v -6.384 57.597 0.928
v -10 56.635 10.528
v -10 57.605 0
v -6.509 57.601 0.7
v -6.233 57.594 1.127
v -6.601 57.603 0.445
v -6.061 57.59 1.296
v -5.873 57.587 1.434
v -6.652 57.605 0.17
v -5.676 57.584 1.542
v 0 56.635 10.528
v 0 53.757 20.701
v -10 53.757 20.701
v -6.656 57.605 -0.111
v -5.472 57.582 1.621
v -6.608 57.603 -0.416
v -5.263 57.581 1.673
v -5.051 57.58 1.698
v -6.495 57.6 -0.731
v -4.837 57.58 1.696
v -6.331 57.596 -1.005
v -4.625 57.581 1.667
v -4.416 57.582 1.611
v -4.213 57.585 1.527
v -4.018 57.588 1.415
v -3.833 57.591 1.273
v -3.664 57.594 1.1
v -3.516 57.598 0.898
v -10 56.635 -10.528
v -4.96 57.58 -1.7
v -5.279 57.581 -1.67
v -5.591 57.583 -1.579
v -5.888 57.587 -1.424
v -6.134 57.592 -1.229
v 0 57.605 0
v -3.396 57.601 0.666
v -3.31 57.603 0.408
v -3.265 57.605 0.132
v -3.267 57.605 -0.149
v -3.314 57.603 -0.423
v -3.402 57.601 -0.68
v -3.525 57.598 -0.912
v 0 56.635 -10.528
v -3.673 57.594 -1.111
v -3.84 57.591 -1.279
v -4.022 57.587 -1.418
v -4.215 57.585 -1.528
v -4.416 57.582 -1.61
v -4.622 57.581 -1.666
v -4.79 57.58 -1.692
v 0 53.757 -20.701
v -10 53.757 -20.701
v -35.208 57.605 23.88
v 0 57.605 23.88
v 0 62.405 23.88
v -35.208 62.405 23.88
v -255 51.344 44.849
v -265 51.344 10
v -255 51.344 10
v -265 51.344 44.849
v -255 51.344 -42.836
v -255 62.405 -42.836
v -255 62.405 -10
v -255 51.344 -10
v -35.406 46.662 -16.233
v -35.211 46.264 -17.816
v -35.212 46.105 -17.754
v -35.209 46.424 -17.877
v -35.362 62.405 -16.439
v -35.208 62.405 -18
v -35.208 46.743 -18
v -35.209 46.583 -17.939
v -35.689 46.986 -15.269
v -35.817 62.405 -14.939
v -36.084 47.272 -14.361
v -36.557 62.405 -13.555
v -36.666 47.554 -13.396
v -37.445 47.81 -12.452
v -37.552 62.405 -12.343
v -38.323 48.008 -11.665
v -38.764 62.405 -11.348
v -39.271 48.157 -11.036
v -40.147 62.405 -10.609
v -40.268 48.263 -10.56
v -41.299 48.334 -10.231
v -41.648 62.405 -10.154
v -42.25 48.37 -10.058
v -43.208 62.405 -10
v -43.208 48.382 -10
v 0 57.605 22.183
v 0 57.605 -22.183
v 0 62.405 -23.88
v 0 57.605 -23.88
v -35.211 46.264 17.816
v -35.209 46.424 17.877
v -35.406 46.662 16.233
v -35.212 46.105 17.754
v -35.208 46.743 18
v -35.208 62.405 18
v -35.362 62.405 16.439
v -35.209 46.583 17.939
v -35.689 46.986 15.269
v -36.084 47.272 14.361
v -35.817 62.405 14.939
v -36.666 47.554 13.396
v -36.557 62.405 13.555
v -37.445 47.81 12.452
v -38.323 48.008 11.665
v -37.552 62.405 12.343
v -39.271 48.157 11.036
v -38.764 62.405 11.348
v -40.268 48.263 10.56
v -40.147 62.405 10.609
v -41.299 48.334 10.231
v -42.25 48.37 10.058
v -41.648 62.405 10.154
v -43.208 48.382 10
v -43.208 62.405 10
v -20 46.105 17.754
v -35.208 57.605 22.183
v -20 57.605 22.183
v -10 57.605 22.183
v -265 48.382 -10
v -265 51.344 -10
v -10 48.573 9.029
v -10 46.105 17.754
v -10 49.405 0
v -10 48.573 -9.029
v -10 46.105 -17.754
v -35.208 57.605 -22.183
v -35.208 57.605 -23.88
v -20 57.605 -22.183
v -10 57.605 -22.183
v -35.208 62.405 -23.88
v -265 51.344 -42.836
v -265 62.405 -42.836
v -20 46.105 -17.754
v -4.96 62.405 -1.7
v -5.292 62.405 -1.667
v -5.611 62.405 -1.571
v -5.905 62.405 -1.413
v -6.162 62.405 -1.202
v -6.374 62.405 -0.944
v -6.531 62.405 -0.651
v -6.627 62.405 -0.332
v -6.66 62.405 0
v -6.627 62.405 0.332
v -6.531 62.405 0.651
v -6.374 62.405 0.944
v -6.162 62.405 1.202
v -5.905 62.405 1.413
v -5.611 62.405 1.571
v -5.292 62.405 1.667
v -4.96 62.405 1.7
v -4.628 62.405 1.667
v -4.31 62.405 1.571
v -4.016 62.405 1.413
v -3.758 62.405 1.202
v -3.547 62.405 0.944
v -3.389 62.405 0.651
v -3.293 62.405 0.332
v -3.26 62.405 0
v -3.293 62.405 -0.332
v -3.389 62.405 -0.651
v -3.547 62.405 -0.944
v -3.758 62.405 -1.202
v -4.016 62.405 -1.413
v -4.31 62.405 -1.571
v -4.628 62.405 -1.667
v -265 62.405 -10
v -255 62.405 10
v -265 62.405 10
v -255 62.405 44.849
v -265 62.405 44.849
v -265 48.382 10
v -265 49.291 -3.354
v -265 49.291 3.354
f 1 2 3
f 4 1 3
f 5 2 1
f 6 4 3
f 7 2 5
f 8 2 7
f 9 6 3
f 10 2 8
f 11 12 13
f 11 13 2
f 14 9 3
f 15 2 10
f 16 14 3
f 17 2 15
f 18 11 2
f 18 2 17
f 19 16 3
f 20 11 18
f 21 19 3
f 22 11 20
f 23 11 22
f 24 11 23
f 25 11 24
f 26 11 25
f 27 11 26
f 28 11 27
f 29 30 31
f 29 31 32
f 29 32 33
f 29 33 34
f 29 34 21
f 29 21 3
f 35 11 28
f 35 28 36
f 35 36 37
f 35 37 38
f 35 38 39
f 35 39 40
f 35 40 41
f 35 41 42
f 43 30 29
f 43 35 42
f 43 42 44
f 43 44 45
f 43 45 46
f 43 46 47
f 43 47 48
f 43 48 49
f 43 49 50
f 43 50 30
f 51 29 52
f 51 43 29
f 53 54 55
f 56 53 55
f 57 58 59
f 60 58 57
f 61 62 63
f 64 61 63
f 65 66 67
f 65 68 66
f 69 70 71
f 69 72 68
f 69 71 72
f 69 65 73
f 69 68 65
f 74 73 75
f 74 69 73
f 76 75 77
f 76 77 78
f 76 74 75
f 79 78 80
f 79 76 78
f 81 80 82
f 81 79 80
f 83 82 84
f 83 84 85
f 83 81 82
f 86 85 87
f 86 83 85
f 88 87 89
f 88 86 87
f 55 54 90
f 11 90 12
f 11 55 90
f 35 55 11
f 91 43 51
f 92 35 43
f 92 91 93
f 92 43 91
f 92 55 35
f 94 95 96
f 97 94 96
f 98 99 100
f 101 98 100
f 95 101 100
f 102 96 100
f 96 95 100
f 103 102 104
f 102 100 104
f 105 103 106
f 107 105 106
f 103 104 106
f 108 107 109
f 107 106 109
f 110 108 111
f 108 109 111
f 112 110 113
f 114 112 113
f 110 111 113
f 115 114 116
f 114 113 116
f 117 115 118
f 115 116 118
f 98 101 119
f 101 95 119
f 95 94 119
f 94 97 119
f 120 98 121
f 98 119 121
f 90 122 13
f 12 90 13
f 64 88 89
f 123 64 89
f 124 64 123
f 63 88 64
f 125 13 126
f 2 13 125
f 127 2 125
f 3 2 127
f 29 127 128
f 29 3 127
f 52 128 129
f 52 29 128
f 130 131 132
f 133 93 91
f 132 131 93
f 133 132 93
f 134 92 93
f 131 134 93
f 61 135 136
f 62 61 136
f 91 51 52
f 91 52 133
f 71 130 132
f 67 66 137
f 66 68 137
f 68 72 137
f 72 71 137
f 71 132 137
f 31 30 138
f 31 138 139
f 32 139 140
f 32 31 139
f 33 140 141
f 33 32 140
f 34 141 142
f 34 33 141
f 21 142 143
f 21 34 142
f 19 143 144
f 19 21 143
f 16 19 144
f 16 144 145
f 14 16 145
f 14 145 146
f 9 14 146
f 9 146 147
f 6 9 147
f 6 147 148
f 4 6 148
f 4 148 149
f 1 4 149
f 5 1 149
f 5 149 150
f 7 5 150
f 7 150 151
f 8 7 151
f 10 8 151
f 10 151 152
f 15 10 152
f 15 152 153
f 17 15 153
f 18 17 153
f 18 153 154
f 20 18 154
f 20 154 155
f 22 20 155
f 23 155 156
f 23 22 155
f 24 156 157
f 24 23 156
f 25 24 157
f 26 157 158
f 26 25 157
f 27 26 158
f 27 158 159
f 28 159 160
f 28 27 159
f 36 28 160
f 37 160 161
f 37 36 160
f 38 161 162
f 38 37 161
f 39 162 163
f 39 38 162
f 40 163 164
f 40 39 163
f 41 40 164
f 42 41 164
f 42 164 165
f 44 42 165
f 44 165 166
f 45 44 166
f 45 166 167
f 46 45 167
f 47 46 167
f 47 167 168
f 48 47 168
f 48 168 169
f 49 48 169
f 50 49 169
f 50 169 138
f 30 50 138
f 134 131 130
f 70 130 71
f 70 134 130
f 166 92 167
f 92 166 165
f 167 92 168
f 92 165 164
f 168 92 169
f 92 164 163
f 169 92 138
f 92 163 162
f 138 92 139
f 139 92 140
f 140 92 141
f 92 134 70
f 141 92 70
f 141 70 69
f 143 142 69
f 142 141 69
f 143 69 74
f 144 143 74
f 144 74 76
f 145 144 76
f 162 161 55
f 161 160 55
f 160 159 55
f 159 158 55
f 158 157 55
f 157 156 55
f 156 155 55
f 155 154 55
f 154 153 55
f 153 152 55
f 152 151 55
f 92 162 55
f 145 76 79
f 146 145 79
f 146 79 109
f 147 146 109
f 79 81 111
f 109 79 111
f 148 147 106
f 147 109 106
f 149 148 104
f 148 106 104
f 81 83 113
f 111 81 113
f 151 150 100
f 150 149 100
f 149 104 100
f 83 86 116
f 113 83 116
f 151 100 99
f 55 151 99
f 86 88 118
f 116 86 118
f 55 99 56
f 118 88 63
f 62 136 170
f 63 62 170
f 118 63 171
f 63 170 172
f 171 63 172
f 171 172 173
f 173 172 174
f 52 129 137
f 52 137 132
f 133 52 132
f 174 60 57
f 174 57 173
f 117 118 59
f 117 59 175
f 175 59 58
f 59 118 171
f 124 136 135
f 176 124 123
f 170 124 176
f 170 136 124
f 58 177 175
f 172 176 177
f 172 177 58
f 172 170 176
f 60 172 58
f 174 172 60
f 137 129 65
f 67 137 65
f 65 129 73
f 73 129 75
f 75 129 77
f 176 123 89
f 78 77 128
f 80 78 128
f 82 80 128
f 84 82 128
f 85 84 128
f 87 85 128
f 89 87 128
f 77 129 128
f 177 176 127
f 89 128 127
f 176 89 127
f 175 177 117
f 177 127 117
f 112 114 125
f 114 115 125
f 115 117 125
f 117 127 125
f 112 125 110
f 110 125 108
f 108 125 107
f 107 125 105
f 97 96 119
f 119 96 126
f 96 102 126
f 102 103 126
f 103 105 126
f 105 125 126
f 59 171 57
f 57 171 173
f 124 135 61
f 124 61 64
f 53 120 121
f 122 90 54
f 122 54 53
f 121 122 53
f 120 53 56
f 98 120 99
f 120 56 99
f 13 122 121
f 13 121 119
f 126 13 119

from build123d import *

# Parameters (mm, degrees)
EXTRUDE_1_DEPTH     = 10
EXTRUDE_START       = 10
EXTRUDE_2_DEPTH     = 10
EXTRUDE_START_2     = -20
SKETCH_5_W          = 47.76055714
SKETCH_5_H          = 4.8
EXTRUDE_3_DEPTH     = 20
SKETCH_4_R          = 1.7
CUT_EXTRUDE_1_DEPTH = 70.746966001
EXTRUDE_1_2_DEPTH   = 245
CUT_EXTRUDE_2_DEPTH = 267.572630949
SKETCH_8_W          = 87.68405268
SKETCH_8_H          = 11.060470773
EXTRUDE_2_2_DEPTH   = 10


with BuildPart() as part:
    # 草图2 → Extrude 1 (new body)
    with BuildSketch(Plane.ZY.offset(10)):
        with BuildLine():
            ThreePointArc((17.754161429, 46.104597493), (0, 49.404900142), (-17.754161429, 46.104597493))
            Line((-17.754161429, 46.104597493), (-22.425845774, 58.236182937))
            ThreePointArc((-22.425845774, 58.236182937), (0, 62.404900142), (22.425845774, 58.236182937))
            Line((22.425845774, 58.236182937), (17.754161429, 46.104597493))
        make_face()
    extrude(amount=EXTRUDE_1_DEPTH)

    # 草图3 → Extrude 2 (add)
    with BuildSketch(Plane(origin=(-10, 0, 0), x_dir=(0, 0, -1), z_dir=(1, 0, 0)).offset(EXTRUDE_START)):
        with BuildLine():
            ThreePointArc((22.425845774, 58.236182937), (0, 62.404900142), (-22.425845774, 58.236182937))
            Line((-22.425845774, 58.236182937), (-20.700916169, 53.756828311))
            ThreePointArc((-20.700916169, 53.756828311), (0, 57.604900142), (20.700916169, 53.756828311))
            Line((20.700916169, 53.756828311), (22.425845774, 58.236182937))
        make_face()
    extrude(amount=-EXTRUDE_2_DEPTH)

    # 草图5 → 拉伸-薄壁3 (add)
    with BuildSketch(Plane(origin=(0, 0, 0), x_dir=(0, 0, -1), z_dir=(1, 0, 0)).offset(EXTRUDE_START_2)):
        with Locations((0, 60.004900142)):
            Rectangle(SKETCH_5_W, SKETCH_5_H)
    extrude(amount=EXTRUDE_3_DEPTH)

    # 草图4 → 切除-拉伸1 (cut, through all)
    with BuildSketch(Plane(origin=(0, 0, 0), x_dir=(1, 0, 0), z_dir=(0, 1, 0))):
        with Locations(Location((-4.960065679, 0, 0), (0, 0, 90))):
            Circle(SKETCH_4_R)
    extrude(amount=CUT_EXTRUDE_1_DEPTH, mode=Mode.SUBTRACT)

    # 草图6 → Extrude 1 2 (add)
    with BuildSketch(Plane.ZY.offset(20)):
        with BuildLine():
            Line((23.88027857, 62.404900142), (-23.88027857, 62.404900142))
            Line((-23.88027857, 62.404900142), (-23.88027857, 57.604900142))
            Line((-23.88027857, 57.604900142), (-22.182748615, 57.604900142))
            Line((-22.182748615, 57.604900142), (-17.754161429, 46.104597493))
            ThreePointArc((-17.754161429, 46.104597493), (0, 49.404900142), (17.754161429, 46.104597493))
            Line((17.754161429, 46.104597493), (22.182748615, 57.604900142))
            Line((22.182748615, 57.604900142), (23.88027857, 57.604900142))
            Line((23.88027857, 57.604900142), (23.88027857, 62.404900142))
        make_face()
    extrude(amount=EXTRUDE_1_2_DEPTH)

    # 草图7 → 切除-拉伸2 (cut, through all)
    with BuildSketch(Plane(origin=(0, 62.404900142, 0), x_dir=(1, 0, 0), z_dir=(0, 1, 0))):
        with BuildLine():
            Line((-35.208375229, 23.88027857), (-35.208375229, 18))
            ThreePointArc((-35.208375229, 18), (-37.55152098, 12.343145751), (-43.208375229, 10))
            Line((-43.208375229, 10), (-265, 10))
            Line((-265, 10), (-265, 23.88027857))
            Line((-265, 23.88027857), (-35.208375229, 23.88027857))
        make_face()
        with BuildLine():
            Line((-43.208375229, -10), (-265, -10))
            Line((-265, -10), (-265, -23.88027857))
            Line((-265, -23.88027857), (-35.208375229, -23.88027857))
            Line((-35.208375229, -23.88027857), (-35.208375229, -18))
            ThreePointArc((-35.208375229, -18), (-37.55152098, -12.343145751), (-43.208375229, -10))
        make_face()
    extrude(amount=-CUT_EXTRUDE_2_DEPTH, mode=Mode.SUBTRACT)

    # 草图8 → Extrude 2 2 (add)
    with BuildSketch(Plane.ZY.offset(265)):
        with Locations((1.006520642, 56.874664756)):
            Rectangle(SKETCH_8_W, SKETCH_8_H)
    extrude(amount=-EXTRUDE_2_2_DEPTH)


solid = part.part
